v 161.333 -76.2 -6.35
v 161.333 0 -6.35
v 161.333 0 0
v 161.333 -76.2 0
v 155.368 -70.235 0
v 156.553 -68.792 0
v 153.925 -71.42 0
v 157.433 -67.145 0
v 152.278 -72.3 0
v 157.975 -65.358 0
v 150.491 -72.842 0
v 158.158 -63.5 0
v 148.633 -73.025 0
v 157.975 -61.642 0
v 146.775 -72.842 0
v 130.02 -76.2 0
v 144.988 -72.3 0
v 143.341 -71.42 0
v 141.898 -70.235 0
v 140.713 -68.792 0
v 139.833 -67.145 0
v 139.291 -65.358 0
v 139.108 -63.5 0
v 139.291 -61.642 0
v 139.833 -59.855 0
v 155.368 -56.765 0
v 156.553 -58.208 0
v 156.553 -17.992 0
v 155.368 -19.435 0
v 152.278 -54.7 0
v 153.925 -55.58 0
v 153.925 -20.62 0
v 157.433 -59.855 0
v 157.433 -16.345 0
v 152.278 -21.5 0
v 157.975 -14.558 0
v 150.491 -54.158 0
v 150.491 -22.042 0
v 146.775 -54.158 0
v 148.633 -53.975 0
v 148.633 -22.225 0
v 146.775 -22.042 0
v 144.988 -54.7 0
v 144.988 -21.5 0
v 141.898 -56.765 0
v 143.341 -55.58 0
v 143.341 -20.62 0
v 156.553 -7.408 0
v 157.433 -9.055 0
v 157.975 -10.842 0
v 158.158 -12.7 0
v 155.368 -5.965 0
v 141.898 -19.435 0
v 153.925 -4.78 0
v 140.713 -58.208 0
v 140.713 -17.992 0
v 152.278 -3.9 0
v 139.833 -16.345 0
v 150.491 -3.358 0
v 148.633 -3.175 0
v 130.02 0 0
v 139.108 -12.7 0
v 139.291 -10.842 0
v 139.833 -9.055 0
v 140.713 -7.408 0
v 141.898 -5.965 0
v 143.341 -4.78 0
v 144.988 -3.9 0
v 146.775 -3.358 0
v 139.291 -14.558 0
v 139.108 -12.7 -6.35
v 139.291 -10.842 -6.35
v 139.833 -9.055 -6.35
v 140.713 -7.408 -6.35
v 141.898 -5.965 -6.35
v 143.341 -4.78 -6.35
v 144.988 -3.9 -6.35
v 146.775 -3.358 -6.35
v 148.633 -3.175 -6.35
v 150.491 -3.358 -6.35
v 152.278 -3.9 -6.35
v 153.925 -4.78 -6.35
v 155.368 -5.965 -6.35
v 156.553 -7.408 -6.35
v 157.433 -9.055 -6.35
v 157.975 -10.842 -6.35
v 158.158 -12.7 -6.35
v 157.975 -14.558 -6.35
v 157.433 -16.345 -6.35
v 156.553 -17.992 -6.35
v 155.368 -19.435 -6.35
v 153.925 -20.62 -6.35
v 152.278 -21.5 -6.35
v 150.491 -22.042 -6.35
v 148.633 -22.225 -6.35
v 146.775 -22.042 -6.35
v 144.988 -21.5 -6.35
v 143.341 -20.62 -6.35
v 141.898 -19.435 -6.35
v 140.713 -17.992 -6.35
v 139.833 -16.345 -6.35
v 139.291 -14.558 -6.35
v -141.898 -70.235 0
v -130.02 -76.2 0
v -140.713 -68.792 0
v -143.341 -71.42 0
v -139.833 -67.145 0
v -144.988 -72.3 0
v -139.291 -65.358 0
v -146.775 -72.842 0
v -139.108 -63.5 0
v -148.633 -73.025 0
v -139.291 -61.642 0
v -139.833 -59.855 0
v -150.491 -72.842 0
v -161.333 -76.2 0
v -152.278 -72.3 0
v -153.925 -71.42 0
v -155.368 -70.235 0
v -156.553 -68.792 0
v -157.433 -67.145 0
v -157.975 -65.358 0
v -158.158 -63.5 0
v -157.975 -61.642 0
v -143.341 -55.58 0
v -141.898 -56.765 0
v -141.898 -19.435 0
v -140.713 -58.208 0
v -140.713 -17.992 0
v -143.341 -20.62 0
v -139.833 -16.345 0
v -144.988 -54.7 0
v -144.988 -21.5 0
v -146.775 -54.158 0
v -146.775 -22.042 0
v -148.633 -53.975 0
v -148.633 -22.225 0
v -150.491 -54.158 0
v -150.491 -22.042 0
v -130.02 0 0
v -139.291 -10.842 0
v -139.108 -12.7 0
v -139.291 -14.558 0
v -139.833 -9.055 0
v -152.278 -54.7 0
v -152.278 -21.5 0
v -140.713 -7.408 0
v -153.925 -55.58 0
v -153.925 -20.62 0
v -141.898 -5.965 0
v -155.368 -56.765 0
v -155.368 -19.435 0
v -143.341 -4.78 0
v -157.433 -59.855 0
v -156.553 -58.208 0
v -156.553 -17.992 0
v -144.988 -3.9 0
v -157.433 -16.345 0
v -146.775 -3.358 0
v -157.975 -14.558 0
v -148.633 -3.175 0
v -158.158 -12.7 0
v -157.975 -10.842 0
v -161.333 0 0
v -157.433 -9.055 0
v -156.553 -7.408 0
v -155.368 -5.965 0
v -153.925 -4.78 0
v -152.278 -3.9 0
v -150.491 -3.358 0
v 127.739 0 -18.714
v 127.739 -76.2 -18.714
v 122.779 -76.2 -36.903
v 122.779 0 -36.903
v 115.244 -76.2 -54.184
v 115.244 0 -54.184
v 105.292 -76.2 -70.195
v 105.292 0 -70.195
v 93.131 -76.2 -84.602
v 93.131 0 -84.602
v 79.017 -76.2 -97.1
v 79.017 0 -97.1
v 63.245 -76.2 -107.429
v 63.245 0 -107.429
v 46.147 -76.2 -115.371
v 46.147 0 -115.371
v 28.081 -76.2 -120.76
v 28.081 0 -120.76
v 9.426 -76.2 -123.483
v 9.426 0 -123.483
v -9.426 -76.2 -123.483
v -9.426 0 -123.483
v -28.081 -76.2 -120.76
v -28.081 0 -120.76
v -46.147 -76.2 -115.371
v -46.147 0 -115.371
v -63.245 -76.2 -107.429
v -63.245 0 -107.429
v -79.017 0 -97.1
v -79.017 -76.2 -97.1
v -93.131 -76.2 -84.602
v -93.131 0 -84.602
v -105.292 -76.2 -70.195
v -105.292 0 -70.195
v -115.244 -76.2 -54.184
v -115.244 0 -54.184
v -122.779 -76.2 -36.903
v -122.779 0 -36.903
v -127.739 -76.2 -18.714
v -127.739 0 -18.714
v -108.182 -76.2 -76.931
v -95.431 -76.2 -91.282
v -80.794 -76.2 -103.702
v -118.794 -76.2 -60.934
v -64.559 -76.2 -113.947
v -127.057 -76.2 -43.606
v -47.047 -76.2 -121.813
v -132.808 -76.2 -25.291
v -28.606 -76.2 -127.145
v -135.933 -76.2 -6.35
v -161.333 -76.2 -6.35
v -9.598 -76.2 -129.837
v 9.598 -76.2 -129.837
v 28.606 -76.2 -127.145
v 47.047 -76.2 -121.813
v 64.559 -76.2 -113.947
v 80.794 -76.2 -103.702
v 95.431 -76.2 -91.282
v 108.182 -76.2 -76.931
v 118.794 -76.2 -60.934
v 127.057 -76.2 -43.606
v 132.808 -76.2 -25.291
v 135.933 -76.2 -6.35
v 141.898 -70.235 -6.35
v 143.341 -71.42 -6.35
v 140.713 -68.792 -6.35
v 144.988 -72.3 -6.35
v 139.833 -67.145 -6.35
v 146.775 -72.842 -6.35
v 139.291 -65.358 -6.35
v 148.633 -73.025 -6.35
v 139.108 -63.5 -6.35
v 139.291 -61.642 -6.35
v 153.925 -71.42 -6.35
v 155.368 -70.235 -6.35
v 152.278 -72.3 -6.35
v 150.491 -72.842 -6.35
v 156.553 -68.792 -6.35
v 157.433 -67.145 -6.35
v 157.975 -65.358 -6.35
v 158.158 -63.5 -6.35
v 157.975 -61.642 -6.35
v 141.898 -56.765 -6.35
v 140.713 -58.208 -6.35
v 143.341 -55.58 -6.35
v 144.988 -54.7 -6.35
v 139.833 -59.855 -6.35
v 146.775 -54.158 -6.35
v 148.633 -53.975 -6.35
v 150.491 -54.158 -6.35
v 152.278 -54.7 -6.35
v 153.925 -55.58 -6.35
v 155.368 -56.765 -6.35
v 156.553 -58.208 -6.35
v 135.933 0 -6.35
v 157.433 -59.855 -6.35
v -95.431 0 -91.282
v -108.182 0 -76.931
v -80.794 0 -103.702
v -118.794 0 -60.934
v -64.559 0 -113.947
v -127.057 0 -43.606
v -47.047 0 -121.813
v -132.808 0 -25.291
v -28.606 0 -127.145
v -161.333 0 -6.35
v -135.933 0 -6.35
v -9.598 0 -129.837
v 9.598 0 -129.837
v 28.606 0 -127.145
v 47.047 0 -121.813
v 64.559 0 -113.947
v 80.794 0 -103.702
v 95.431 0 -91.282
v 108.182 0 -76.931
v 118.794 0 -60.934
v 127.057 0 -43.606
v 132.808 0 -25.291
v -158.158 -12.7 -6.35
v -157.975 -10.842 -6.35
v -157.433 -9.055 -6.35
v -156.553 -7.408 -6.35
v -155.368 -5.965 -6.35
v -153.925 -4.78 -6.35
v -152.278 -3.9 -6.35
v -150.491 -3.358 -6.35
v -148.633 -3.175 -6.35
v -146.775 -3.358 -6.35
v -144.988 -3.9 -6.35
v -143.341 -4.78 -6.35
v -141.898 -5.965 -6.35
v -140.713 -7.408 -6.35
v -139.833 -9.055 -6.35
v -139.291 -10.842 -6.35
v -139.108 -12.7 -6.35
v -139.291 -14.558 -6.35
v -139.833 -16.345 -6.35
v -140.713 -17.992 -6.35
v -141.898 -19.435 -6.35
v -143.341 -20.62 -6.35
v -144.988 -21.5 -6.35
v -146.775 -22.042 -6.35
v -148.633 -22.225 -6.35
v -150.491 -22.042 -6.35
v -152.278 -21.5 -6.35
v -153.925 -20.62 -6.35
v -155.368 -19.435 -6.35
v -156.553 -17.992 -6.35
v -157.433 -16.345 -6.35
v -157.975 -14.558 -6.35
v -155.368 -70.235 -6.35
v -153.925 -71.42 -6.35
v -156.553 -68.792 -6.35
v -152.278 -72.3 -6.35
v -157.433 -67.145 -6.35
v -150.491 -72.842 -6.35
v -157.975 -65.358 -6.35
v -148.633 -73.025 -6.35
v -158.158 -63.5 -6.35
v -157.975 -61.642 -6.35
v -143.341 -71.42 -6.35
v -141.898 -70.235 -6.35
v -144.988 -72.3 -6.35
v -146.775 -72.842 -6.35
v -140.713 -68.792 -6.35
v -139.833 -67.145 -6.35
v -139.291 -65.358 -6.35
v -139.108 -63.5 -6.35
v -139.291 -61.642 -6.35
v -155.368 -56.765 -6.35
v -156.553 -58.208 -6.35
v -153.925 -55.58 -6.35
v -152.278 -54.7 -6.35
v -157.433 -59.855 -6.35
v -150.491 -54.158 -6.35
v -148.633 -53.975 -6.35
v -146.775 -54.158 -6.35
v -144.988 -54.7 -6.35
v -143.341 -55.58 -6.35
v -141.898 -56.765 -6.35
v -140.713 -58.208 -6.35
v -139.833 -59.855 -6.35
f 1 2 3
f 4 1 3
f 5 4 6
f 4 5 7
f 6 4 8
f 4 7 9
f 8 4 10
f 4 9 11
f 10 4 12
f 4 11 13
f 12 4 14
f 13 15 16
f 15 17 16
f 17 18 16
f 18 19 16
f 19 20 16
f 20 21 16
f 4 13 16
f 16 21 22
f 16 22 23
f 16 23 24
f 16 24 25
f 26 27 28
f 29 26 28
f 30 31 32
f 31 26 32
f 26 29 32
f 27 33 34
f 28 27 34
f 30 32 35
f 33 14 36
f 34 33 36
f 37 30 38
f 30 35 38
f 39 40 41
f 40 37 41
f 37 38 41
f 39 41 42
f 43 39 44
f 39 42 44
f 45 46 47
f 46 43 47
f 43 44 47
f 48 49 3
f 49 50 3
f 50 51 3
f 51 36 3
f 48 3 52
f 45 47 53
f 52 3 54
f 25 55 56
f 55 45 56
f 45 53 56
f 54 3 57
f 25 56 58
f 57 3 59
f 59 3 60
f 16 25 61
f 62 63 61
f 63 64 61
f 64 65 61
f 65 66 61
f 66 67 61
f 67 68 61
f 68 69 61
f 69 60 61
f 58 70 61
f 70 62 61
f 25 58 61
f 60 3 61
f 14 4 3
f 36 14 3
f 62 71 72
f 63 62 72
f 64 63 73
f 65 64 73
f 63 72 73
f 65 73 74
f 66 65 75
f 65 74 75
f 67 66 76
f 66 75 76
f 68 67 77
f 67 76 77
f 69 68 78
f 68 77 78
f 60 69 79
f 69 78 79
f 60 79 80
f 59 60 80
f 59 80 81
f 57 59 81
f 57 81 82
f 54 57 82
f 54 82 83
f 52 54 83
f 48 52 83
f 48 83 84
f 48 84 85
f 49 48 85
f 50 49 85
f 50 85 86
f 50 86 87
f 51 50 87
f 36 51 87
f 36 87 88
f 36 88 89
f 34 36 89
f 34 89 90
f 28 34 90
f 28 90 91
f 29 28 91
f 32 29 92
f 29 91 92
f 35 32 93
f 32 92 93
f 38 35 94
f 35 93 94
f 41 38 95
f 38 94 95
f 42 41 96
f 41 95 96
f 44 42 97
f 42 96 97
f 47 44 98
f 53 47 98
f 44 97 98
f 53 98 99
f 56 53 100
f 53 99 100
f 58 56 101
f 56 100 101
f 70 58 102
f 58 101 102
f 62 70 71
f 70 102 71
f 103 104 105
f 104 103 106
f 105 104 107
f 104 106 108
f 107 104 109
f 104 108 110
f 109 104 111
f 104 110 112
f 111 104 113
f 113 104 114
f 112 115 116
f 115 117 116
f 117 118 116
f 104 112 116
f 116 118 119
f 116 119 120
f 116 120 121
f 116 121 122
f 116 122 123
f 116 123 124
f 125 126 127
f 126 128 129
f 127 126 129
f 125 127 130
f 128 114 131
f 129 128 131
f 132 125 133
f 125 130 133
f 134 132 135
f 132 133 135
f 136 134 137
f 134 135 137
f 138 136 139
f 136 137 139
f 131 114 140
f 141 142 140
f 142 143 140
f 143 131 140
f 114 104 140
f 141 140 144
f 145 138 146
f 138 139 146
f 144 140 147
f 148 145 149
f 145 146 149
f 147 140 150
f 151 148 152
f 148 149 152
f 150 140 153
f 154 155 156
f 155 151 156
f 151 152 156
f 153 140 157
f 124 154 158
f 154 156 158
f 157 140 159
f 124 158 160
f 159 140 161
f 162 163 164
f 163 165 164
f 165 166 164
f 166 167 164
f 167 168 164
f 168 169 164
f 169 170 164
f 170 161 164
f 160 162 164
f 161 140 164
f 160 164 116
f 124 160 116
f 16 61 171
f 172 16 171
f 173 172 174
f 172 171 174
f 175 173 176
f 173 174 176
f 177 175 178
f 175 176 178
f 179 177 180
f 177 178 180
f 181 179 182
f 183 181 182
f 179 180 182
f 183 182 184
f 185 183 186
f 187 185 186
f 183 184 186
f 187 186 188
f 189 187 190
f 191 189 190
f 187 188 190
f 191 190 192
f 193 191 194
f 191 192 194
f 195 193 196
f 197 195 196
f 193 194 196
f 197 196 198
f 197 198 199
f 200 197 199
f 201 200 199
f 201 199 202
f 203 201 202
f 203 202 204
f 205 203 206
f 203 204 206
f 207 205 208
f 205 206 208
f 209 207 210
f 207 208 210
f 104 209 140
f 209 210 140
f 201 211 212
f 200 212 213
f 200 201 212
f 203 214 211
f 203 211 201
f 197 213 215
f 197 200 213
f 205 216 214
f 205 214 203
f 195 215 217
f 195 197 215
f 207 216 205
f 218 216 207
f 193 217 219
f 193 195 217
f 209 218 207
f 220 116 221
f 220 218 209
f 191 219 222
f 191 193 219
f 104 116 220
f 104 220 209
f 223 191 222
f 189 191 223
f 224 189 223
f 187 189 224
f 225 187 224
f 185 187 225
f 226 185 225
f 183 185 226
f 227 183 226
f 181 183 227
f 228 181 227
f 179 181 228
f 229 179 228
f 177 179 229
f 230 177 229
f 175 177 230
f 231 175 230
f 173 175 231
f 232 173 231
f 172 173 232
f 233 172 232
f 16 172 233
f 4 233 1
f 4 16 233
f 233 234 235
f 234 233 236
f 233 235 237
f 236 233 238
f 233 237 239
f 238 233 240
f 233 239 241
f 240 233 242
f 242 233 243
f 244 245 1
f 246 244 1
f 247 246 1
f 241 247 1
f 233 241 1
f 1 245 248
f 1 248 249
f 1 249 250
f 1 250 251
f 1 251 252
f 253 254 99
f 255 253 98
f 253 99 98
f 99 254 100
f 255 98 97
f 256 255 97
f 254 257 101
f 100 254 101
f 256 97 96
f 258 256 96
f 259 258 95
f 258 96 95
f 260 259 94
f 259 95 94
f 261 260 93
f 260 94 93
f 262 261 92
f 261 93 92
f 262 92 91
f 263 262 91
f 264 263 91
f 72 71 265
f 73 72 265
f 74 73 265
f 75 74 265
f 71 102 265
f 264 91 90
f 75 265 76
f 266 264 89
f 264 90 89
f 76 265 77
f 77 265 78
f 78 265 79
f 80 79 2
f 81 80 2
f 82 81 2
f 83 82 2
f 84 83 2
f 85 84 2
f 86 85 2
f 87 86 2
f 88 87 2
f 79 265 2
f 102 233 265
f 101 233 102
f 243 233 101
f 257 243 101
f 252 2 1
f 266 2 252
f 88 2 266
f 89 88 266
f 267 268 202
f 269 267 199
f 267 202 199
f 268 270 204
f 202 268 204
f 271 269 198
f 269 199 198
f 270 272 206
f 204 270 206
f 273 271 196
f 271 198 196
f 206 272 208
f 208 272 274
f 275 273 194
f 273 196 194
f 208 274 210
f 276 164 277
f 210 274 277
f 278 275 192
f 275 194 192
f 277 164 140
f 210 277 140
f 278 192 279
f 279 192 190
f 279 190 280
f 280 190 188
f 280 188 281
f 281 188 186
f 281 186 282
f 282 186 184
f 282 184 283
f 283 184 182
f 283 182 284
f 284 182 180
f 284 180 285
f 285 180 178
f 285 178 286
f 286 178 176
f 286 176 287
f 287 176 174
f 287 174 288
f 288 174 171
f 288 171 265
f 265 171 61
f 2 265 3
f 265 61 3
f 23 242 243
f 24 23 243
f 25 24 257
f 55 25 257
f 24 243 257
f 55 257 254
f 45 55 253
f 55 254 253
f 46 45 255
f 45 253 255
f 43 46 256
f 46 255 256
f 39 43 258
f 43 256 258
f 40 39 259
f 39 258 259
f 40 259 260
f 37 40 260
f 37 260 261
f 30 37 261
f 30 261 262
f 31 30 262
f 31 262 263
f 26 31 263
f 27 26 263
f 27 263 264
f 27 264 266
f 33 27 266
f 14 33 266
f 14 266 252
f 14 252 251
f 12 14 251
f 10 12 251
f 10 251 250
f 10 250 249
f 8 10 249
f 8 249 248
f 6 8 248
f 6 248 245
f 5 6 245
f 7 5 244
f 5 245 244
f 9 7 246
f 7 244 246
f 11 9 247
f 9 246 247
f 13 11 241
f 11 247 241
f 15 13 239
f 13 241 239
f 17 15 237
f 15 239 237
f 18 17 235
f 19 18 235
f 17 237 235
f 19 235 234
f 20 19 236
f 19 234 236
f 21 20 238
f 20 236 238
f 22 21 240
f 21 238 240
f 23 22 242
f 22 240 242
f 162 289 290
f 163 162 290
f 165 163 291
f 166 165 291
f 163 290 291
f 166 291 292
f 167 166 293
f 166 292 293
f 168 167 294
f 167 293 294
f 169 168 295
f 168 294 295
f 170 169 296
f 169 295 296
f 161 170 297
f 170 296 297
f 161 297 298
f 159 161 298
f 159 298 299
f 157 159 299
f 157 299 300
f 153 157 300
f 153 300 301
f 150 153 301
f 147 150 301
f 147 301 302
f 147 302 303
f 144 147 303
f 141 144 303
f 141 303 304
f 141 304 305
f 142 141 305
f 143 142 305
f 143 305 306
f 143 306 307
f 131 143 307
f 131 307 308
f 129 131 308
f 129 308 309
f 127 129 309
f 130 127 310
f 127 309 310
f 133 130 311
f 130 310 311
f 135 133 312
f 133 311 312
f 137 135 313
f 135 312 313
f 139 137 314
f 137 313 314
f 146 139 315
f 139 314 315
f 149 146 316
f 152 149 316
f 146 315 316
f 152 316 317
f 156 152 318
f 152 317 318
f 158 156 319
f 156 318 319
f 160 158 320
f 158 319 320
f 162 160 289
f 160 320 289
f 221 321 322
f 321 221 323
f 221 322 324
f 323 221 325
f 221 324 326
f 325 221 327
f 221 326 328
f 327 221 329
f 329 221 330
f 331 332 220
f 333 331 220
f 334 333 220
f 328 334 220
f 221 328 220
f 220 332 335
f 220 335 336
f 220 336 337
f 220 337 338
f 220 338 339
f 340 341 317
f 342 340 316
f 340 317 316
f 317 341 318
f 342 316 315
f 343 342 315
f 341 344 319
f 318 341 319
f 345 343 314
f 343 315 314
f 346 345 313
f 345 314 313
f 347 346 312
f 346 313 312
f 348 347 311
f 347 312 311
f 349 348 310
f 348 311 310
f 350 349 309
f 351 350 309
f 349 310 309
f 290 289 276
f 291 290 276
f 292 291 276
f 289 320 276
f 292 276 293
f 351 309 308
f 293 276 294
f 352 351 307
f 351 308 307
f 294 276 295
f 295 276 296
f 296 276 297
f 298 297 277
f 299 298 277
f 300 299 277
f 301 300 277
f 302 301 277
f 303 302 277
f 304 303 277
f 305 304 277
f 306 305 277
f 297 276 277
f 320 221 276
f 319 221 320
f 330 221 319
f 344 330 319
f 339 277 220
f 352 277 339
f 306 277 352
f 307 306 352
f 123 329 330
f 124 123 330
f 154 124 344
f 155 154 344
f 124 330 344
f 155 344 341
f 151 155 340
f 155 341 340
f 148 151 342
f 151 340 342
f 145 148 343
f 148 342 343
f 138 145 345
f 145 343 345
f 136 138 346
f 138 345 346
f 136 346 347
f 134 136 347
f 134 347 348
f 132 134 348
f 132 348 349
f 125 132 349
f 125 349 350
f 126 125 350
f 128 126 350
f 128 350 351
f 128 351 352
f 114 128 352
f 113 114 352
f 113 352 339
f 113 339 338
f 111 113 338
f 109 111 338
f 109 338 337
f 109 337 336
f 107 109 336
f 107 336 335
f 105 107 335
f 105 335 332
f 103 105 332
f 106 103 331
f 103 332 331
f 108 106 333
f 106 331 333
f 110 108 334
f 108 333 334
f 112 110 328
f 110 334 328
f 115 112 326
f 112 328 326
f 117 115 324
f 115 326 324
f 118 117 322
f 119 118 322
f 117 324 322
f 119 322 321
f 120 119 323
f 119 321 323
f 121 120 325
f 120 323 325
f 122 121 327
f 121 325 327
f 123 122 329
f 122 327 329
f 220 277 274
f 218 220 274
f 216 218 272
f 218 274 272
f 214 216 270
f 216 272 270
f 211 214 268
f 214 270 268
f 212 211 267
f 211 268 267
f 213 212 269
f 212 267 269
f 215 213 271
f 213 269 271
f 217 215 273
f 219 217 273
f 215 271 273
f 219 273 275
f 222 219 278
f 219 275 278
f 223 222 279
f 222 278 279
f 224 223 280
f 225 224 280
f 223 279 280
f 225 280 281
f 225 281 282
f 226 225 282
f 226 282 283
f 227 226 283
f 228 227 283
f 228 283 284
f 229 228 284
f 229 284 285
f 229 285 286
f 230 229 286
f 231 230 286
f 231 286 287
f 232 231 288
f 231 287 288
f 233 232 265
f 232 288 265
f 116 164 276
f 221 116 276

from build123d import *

# Parameters (mm, degrees)
F1_DEPTH = 76.2
F3_D     = 19.05


with BuildPart() as f1:
    # F0 (on Front) → F1 (new body)
    with BuildSketch(Plane.XZ):
        with BuildLine():
            Line((-161.333019, -6.35), (-135.933019, -6.35))
            ThreePointArc((-135.933019, -6.35), (0, -130.175), (135.933019, -6.35))
            Line((135.933019, -6.35), (161.333019, -6.35))
            Line((161.333019, -6.35), (161.333019, 0))
            Line((161.333019, 0), (130.02003, 0))
            ThreePointArc((130.02003, 0), (0, -123.825), (-130.02003, 0))
            Line((-130.02003, 0), (-161.333019, 0))
            Line((-161.333019, 0), (-161.333019, -6.35))
        make_face()
    extrude(amount=F1_DEPTH)

    # F3 (through all)
    with Locations(Plane.XY):
        with Locations((-148.633019, -63.5), (-148.633019, -12.7), (148.633019, -63.5), (148.633019, -12.7)):
            Hole(F3_D / 2)


solid = f1.part
